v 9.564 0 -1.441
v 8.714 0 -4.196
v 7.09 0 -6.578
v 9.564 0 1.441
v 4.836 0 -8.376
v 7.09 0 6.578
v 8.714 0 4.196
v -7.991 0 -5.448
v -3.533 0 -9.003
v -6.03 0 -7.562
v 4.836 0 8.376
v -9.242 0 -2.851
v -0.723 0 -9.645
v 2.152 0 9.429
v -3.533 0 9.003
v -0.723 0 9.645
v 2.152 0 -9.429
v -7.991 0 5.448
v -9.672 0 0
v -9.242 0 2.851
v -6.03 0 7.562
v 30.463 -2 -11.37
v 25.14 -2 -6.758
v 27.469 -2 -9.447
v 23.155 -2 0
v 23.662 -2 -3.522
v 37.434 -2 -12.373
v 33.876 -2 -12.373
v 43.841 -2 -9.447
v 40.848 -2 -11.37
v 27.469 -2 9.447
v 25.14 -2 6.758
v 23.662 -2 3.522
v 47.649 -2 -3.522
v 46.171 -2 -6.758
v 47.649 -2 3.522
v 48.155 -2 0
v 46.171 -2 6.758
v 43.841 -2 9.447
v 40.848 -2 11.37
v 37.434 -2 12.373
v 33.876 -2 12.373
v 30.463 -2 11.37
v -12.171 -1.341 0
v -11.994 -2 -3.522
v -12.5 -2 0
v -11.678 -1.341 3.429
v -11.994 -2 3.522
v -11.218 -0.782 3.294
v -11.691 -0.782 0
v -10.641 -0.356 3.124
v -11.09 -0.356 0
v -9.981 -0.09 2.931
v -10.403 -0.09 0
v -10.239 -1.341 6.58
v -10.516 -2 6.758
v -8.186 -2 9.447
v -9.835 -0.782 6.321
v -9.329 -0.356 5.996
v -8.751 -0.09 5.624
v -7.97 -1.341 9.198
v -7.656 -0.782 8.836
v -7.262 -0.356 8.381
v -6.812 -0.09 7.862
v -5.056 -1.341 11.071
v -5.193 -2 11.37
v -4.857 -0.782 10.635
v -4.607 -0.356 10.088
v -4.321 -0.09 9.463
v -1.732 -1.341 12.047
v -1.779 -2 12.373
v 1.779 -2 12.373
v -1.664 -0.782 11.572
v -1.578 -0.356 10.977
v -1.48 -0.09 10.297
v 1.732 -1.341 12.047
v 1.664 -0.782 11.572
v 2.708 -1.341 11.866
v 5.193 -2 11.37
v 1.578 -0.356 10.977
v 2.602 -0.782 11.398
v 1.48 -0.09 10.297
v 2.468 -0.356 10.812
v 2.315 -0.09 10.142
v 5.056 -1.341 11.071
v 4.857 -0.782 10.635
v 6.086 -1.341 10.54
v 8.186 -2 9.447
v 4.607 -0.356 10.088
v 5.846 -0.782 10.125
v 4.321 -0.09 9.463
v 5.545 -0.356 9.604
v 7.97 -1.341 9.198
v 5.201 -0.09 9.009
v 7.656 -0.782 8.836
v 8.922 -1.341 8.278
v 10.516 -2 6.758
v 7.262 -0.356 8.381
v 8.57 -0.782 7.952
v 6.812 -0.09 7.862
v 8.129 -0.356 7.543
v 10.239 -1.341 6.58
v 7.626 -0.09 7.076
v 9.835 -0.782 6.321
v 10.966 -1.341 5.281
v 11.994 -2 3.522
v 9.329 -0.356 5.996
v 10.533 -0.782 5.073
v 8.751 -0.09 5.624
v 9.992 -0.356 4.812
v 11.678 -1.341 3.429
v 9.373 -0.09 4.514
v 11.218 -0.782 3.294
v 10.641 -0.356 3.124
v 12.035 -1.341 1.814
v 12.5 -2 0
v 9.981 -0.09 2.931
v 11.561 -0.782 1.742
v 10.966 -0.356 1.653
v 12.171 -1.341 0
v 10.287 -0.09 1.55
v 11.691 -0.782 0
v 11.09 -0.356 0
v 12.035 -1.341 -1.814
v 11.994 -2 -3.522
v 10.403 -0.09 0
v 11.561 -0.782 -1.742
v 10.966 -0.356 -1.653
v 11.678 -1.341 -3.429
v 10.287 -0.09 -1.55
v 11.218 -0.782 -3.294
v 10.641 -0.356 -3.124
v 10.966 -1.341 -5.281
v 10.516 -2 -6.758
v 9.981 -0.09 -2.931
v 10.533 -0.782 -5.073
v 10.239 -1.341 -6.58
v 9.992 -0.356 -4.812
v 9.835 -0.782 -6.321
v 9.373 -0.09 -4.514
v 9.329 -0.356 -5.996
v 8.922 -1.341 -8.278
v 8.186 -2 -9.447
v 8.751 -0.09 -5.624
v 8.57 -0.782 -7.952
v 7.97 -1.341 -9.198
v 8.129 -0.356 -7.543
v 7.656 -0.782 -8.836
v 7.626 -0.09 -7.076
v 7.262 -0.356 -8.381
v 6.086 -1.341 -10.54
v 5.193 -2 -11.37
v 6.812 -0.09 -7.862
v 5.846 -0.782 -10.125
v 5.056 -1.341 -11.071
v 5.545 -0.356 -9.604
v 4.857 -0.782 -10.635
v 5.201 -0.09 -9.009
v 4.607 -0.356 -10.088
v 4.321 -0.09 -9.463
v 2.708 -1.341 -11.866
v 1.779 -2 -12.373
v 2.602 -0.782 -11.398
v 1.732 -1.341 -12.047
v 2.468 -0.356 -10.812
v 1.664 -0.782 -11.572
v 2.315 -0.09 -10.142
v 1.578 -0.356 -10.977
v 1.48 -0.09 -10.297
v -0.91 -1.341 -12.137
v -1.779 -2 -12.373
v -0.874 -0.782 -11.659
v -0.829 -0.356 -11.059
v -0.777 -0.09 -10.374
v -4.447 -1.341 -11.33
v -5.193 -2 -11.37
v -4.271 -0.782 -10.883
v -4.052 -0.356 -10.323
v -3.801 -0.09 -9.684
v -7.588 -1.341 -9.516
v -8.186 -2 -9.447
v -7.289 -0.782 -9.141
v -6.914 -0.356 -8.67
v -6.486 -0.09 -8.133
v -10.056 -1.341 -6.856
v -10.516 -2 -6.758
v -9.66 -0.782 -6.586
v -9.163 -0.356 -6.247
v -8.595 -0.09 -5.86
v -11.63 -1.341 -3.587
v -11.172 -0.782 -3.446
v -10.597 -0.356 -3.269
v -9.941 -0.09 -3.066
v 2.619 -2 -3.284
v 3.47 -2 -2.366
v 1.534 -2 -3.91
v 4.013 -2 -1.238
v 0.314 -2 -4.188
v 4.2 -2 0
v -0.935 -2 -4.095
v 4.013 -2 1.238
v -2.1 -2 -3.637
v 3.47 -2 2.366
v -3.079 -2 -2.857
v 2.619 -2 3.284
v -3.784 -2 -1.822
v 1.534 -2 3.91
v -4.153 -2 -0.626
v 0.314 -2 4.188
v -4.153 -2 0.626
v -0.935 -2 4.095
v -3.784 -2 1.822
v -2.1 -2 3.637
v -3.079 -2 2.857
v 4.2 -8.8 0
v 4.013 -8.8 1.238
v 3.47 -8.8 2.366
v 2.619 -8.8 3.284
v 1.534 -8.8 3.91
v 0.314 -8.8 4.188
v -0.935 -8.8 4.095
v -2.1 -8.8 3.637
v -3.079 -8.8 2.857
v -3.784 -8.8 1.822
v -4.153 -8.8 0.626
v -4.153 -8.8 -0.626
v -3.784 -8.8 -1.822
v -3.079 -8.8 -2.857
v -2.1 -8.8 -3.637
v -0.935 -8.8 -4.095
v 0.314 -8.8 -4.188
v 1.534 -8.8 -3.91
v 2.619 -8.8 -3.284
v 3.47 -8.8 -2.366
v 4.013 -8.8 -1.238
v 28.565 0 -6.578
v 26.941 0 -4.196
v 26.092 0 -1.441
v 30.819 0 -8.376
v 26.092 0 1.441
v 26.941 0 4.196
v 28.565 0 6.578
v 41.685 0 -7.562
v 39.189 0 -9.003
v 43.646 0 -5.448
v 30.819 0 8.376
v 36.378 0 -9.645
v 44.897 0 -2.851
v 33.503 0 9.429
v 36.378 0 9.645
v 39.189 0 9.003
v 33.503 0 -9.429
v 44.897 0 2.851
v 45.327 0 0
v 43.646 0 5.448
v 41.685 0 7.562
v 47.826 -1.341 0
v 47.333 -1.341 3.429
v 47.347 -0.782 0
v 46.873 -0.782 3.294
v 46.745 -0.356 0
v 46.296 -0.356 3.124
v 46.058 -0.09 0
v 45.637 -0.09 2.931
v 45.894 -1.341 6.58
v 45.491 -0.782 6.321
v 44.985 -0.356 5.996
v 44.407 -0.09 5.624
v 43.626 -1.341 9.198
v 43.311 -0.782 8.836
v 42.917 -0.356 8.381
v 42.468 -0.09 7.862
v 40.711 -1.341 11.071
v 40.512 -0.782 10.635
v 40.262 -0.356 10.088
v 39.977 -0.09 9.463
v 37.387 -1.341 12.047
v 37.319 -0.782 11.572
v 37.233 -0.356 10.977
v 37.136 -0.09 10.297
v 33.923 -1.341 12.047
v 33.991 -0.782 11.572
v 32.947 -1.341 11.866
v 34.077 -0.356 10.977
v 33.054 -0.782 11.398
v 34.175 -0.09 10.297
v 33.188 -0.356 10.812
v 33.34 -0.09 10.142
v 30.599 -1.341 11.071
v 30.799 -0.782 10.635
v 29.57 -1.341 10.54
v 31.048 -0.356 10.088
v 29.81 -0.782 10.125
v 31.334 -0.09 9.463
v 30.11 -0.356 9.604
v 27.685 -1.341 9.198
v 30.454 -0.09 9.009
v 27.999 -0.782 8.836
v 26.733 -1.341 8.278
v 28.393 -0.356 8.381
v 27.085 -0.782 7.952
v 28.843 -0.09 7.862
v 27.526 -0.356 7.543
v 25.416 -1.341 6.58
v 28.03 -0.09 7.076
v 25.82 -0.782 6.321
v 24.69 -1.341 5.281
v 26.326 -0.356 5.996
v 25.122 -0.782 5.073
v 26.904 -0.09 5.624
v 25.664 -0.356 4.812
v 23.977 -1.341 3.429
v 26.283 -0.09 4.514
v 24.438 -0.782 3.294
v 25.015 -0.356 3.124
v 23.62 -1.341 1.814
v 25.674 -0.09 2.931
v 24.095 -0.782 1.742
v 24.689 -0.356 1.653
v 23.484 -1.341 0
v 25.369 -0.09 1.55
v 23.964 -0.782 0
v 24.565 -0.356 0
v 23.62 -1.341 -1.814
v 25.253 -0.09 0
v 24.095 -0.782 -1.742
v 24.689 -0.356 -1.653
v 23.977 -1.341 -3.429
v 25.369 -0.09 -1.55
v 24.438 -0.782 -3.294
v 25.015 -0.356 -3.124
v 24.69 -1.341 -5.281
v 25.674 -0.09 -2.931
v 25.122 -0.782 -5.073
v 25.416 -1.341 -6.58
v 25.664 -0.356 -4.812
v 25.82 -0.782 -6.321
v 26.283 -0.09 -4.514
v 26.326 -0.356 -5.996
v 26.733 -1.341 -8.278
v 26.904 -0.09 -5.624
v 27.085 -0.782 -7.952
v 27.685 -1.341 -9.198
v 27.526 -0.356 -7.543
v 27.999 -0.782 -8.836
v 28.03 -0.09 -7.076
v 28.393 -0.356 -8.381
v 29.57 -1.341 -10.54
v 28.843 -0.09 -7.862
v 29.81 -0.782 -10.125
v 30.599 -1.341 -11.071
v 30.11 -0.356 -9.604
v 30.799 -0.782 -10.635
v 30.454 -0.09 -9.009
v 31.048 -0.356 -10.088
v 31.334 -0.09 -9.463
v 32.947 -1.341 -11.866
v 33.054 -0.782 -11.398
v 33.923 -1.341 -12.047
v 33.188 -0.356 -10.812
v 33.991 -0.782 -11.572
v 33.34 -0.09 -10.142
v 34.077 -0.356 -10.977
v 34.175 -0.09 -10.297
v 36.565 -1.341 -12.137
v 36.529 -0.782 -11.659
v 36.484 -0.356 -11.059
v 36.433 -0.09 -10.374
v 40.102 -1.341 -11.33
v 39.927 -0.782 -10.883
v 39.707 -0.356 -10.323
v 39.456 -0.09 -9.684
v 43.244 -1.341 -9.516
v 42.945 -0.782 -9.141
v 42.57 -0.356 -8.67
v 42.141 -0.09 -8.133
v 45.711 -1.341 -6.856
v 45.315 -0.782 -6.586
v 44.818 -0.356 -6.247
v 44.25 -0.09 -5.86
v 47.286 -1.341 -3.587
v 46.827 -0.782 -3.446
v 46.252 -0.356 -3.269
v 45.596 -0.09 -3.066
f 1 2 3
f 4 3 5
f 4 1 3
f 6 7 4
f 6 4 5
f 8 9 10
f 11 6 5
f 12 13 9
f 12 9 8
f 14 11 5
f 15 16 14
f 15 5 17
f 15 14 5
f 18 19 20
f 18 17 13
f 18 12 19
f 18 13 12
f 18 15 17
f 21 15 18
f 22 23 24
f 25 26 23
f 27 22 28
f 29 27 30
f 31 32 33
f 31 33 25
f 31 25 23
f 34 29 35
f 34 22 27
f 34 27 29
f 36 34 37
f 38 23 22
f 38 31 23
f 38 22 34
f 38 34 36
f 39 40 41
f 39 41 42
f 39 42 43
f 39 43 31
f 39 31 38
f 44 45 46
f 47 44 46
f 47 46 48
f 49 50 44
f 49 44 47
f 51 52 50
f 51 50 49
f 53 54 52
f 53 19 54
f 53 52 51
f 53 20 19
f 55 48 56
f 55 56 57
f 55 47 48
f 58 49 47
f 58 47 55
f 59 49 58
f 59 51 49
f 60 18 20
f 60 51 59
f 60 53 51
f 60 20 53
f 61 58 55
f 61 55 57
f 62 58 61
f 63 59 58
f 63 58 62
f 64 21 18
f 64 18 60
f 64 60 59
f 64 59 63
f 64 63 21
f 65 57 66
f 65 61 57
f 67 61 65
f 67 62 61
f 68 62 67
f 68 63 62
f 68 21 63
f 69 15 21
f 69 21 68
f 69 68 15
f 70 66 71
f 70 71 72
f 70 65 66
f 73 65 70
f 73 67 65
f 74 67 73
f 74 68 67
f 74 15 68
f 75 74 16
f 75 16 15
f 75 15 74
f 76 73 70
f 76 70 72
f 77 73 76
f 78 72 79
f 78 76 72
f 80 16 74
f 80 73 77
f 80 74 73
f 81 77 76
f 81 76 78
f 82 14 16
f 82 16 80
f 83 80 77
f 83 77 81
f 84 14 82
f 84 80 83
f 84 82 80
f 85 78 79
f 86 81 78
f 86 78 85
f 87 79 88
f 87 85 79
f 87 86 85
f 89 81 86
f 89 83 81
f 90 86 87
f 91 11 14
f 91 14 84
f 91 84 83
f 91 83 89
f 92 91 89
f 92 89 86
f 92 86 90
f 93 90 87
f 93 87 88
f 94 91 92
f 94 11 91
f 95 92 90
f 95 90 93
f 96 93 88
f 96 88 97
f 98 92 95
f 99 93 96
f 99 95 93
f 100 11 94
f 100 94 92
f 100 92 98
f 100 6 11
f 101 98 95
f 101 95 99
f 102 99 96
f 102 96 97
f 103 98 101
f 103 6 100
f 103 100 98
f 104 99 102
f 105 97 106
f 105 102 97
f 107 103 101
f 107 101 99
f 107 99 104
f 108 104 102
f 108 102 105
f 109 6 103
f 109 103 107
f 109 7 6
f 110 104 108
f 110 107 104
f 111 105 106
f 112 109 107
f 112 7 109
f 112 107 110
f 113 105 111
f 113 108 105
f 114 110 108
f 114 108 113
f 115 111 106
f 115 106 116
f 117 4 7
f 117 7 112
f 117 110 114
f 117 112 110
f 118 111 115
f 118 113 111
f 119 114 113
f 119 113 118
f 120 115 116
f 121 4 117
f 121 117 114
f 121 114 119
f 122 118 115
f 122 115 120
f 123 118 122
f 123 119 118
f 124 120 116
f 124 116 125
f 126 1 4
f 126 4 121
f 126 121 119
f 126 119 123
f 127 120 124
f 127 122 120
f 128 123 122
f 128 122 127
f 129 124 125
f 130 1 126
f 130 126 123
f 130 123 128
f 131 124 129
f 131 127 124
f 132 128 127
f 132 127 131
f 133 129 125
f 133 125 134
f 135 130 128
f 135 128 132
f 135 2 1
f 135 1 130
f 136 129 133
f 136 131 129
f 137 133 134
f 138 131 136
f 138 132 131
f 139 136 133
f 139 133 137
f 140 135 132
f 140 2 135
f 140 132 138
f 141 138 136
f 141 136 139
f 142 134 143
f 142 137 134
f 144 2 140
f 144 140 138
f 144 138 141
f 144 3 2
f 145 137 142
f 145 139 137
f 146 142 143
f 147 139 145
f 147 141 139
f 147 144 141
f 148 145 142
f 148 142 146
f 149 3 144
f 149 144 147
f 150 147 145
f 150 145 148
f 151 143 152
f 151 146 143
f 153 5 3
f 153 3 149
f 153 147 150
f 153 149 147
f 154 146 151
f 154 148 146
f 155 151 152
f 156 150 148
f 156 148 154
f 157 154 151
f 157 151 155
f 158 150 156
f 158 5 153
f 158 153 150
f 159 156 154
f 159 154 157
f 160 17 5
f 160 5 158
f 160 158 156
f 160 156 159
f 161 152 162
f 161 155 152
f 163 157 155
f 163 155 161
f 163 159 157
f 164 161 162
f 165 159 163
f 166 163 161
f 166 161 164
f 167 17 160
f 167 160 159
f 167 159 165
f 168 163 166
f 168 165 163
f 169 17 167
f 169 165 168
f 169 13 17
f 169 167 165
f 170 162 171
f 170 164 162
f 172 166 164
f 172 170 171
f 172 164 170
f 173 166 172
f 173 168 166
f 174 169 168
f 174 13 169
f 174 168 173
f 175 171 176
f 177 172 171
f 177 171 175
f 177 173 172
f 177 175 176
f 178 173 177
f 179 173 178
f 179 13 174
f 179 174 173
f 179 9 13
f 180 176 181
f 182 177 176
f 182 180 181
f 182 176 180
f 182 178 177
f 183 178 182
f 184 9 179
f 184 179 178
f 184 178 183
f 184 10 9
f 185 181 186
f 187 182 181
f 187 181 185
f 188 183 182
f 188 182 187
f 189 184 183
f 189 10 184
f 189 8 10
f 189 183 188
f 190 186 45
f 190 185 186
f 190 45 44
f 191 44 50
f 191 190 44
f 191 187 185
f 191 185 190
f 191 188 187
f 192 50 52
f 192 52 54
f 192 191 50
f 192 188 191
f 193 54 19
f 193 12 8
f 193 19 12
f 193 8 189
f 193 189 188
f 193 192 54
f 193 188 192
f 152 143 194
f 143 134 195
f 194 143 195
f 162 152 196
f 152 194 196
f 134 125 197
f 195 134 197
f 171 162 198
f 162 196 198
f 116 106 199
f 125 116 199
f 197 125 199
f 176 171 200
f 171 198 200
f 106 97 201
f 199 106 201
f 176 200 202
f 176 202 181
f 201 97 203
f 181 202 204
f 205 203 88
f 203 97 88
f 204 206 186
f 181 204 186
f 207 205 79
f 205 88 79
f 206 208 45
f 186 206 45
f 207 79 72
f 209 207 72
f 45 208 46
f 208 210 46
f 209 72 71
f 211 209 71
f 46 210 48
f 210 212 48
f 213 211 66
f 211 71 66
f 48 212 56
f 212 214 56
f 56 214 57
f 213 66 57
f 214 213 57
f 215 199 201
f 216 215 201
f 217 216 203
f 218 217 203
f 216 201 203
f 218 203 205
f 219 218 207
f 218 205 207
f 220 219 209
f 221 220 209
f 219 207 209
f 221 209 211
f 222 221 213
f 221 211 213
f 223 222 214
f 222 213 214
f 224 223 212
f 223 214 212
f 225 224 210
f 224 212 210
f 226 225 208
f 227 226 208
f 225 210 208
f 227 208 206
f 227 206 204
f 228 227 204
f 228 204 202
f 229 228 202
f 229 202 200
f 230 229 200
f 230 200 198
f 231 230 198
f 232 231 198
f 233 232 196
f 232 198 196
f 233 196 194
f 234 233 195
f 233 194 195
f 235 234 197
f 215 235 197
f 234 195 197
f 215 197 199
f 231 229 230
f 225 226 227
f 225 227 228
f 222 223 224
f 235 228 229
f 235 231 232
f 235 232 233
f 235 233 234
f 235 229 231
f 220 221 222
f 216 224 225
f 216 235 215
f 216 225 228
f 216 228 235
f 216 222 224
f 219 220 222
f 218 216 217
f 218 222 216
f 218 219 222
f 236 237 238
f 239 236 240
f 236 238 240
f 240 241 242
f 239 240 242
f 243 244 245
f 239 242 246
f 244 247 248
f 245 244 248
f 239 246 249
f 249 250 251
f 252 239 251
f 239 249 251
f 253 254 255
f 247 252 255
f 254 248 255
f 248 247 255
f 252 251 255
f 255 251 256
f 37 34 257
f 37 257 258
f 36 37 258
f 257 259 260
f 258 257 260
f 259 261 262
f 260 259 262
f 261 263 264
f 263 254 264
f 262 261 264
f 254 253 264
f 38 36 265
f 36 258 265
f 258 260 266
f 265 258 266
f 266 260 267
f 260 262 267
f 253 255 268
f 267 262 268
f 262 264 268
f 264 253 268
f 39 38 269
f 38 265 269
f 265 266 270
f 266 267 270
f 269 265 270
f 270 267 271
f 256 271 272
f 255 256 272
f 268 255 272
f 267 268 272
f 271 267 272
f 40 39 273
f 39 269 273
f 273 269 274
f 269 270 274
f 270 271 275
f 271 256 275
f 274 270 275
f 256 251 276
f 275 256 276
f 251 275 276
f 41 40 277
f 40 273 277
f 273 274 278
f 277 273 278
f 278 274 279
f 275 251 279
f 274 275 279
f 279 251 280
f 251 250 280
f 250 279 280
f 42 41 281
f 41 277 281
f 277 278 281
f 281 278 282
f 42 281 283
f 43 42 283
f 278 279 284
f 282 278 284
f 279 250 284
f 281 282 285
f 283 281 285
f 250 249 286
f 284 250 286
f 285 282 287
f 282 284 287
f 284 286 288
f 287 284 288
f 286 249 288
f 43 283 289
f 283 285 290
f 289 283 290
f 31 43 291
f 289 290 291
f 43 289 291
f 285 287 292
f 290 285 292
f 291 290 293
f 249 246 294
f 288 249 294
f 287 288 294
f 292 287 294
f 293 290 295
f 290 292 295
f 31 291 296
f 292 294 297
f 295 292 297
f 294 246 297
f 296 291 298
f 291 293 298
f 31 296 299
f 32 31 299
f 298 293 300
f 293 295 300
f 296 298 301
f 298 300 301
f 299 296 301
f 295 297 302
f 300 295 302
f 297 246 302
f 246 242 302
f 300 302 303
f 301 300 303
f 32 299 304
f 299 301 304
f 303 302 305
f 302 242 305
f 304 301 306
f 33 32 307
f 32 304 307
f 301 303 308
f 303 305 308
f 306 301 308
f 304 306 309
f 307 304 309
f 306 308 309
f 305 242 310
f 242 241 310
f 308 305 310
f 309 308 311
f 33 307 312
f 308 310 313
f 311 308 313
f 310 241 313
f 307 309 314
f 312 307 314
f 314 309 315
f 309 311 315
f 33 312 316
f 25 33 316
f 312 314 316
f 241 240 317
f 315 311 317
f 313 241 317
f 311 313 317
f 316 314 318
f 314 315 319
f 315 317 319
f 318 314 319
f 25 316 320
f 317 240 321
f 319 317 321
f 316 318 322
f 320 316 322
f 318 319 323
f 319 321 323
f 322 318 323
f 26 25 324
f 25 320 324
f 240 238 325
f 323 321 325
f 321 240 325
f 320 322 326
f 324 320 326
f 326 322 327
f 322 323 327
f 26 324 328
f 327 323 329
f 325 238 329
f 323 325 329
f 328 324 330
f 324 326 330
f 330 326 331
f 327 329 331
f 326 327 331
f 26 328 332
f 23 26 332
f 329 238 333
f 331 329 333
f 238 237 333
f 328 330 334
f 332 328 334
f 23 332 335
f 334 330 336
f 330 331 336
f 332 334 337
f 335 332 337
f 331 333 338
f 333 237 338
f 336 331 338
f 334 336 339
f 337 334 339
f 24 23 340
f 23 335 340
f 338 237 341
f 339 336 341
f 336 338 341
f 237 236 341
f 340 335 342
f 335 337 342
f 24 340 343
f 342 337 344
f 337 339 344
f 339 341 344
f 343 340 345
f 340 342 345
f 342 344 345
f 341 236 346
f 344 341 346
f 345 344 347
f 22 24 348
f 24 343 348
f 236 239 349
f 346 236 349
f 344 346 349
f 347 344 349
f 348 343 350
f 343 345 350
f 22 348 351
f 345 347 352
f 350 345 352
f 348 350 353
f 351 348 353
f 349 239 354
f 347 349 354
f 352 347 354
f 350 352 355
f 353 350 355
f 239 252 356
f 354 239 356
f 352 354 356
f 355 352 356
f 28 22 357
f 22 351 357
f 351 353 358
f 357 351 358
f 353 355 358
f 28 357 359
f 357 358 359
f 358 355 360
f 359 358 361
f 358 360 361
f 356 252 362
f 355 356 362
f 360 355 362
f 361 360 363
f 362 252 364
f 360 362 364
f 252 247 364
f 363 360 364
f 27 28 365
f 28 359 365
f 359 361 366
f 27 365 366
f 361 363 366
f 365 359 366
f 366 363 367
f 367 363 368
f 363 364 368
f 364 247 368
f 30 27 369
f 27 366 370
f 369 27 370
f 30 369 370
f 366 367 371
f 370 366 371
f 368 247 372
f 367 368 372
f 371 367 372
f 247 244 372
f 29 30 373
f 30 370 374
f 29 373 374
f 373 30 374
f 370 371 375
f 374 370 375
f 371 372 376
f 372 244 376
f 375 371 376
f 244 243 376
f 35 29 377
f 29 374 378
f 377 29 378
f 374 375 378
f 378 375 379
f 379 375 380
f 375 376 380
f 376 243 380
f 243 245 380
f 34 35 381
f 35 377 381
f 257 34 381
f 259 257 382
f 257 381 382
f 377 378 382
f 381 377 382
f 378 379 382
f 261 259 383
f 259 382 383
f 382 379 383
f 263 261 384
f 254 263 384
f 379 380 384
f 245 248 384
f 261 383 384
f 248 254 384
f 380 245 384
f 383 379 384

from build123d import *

# Parameters (mm, degrees)
F0_R     = 4.2
F1_DEPTH = 6.8
F3_R     = 12.5
F3_R_2   = 4.2
F4_DEPTH = 2
F6_R     = 12.5
F7_DEPTH = 2


# Not quite as in the source:
# - a fillet or chamfer that OpenCascade refuses, or shapes differently, is made with other operations: its cross-section is extruded or revolved along the edge and cut away or added


with BuildPart() as f1:
    # F0 (on Front) → F1 (new body)
    with BuildSketch(Plane.XZ):
        Circle(F0_R)
    extrude(amount=F1_DEPTH)


with BuildPart() as f1_1:
    # F2: moved
    add(f1.part.moved(Location((0, -2, 0))))

    # F3 (on face) → F4 (join)
    with BuildSketch(Plane(origin=(0, -2, 0), x_dir=(-1, 0, 0), z_dir=(0, 1, 0))):
        Circle(F3_R)
        Circle(F3_R_2, mode=Mode.SUBTRACT)
        Circle(F3_R_2)
    extrude(amount=F4_DEPTH)

    # F5: fillet of radius 3 on 1 edges, made by hand

    # F5_s1 → F5_t2 (revolve, cut)
    with BuildSketch(Plane.XY):
        with BuildLine():
            ThreePointArc((-12.5, -2), (-11.4036236828, -0.5505102572), (-9.6715728753, 0))
            Line((-9.6715728753, 0), (-12.5, 0))
            Line((-12.5, 0), (-12.5, -2))
        make_face()
    revolve(axis=Axis((0, 0, 0), (0, 1, 0)), mode=Mode.SUBTRACT)


with BuildPart() as f7:
    # F6 (on Front) → F7 (new body)
    with BuildSketch(Plane.XZ):
        with Locations((35.6552414596, 0)):
            Circle(F6_R)
    extrude(amount=F7_DEPTH)

    # F8: fillet of radius 3 on 1 edges, made by hand

    # F8_s1 → F8_t2 (revolve, cut)
    with BuildSketch(Plane.XY):
        with BuildLine():
            ThreePointArc((48.1552414596, -2), (47.0588651424, -0.5505102572), (45.3268143349, 0))
            Line((45.3268143349, 0), (48.1552414596, 0))
            Line((48.1552414596, 0), (48.1552414596, -2))
        make_face()
    revolve(axis=Axis((35.6552414596, 0, 0), (0, -1, 0)), mode=Mode.SUBTRACT)


solid = Compound([f1_1.part, f7.part])
